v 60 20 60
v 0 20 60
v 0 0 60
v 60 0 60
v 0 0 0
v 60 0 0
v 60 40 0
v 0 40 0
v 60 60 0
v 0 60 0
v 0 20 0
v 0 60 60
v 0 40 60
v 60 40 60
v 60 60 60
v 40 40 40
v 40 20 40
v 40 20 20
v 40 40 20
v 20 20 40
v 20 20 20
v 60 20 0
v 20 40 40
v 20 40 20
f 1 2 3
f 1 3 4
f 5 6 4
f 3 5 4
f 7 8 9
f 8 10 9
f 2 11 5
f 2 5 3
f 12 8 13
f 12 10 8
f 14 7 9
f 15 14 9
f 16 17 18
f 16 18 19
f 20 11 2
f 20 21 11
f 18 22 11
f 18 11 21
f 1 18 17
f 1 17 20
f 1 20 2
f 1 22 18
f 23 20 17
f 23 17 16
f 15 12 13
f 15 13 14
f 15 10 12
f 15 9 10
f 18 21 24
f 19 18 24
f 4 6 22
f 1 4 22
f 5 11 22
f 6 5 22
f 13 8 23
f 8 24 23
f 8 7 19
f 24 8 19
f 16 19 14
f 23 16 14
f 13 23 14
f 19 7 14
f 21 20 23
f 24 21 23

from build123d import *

# Parameters (mm, degrees)
SKETCH1_W           = 60
SKETCH1_H           = 60
BOSS_EXTRUDE1_DEPTH = 60
SKETCH2_W           = 20
SKETCH2_H           = 20
CUT_EXTRUDE1_DEPTH  = 60
SKETCH3_W           = 20
SKETCH3_H           = 20
CUT_EXTRUDE2_DEPTH  = 20
SKETCH4_W           = 20
SKETCH4_H           = 20
CUT_EXTRUDE3_DEPTH  = 20
SKETCH5_W           = 20
SKETCH5_H           = 20
BOSS_EXTRUDE2_DEPTH = 20


with BuildPart() as part:
    # Sketch1 → Boss-Extrude1 (new body)
    with BuildSketch(Plane.XY):
        with Locations((30, 30)):
            Rectangle(SKETCH1_W, SKETCH1_H)
    extrude(amount=BOSS_EXTRUDE1_DEPTH)

    # Sketch2 → Cut-Extrude1 (cut)
    with BuildSketch(Plane.XY.offset(60)):
        with Locations((10, 30)):
            Rectangle(SKETCH2_W, SKETCH2_H)
        with Locations((50, 30)):
            Rectangle(SKETCH2_W, SKETCH2_H)
    extrude(amount=-CUT_EXTRUDE1_DEPTH, mode=Mode.SUBTRACT)

    # Sketch3 → Cut-Extrude2 (cut)
    with BuildSketch(Plane.ZY):
        with Locations((30, 50)):
            Rectangle(SKETCH3_W, SKETCH3_H)
        with Locations((30, 10)):
            Rectangle(SKETCH3_W, SKETCH3_H)
    extrude(amount=-CUT_EXTRUDE2_DEPTH, mode=Mode.SUBTRACT)

    # Sketch4 → Cut-Extrude3 (cut)
    with BuildSketch(Plane.ZY.offset(-20)):
        with Locations((10, 30)):
            Rectangle(SKETCH4_W, SKETCH4_H)
        with Locations((50, 30)):
            Rectangle(SKETCH4_W, SKETCH4_H)
    extrude(amount=-CUT_EXTRUDE3_DEPTH, mode=Mode.SUBTRACT)

    # Sketch5 → Boss-Extrude2 (add)
    with BuildSketch(Plane.ZY.offset(-20)):
        with Locations((30, 50)):
            Rectangle(SKETCH5_W, SKETCH5_H)
        with Locations((30, 10)):
            Rectangle(SKETCH5_W, SKETCH5_H)
    extrude(amount=BOSS_EXTRUDE2_DEPTH)


solid = part.part
